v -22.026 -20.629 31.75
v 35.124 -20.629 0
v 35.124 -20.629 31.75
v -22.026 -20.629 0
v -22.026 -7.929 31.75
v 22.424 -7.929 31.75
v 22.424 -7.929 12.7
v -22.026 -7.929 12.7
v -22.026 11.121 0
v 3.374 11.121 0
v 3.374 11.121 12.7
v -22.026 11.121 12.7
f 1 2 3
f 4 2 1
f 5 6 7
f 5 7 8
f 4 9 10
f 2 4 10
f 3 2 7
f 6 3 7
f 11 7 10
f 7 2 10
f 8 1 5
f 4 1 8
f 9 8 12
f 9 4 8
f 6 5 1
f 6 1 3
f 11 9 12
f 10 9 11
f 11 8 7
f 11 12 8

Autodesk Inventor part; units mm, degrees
ref_plane "YZ Plane" through (0, 0, 0) normal (1, 0, 0) x (0, 1, 0)
ref_plane "XZ Plane" through (0, 0, 0) normal (0, 1, 0) x (-1, 0, 0)
ref_plane "XY Plane" through (0, 0, 0) normal (0, 0, 1) x (1, 0, 0)
sketch "Sketch1" plane through (0, 0, 0) normal (0, 0, 1) x (1, 0, 0)
  line L0 (-22.0262, 11.1206) -> (35.1238, 11.1206)
  line L1 (35.1238, 11.1206) -> (35.1238, -20.6294)
  line L2 (35.1238, -20.6294) -> (-22.0262, -20.6294)
  line L3 (-22.0262, -20.6294) -> (-22.0262, 11.1206)
  point P0 (0, 0)
  dimension "d0" = 57.15
  dimension "d1" = 31.75
extrude "Extrusion1" add sketch "Sketch1" along normal blind 31.75
sketch "Sketch2" plane through (0, 0, 31.75) normal (0, 0, 1) x (1, 0, 0)
  line L0 (35.1238, 11.1206) -> (-22.0262, 11.1206) projected
  line L1 (-22.0262, 11.1206) -> (35.1238, 11.1206)
  line L2 (35.1238, 11.1206) -> (35.1238, -7.9294)
  line L3 (35.1238, -7.9294) -> (-22.0262, -7.9294)
  line L4 (-22.0262, -7.9294) -> (-22.0262, 11.1206)
  point P0 (0, 0)
  dimension "d4" = 19.05
  dimension "d5" = 57.15
extrude "Extrusion2" cut sketch "Sketch2" against normal blind 19.05
sketch "Sketch3" plane through (0, 0, 31.75) normal (0, 0, 1) x (1, 0, 0)
  line L0 (-22.0262, -20.6294) -> (35.1238, -20.6294) projected
  line L1 (35.1238, -20.6294) -> (22.4238, -7.9294)
  line L2 (35.1238, -7.9294) -> (-22.0262, -7.9294) projected
  line L3 (22.4238, -7.9294) -> (35.1238, -7.9294)
  line L4 (35.1238, 11.1206) -> (35.1238, -20.6294) projected
  line L5 (35.1238, -7.9294) -> (35.1238, -20.6294)
  point P0 (0, 0)
  dimension "d8" = 44.45
extrude "Extrusion3" cut sketch "Sketch3" against normal blind 19.05
sketch "Sketch4" plane through (0, 0, 0) normal (0, 0, -1) x (-1, 0, 0)
  line L0 (-35.1238, -20.6294) -> (-22.4238, -7.9294) projected
  line L1 (-35.1238, -20.6294) -> (-3.3738, 11.1206)
  line L2 (22.0262, 11.1206) -> (-35.1238, 11.1206) projected
  line L3 (-3.3738, 11.1206) -> (-35.1238, 11.1206)
  line L4 (-35.1238, 11.1206) -> (-35.1238, -20.6294) projected
  line L5 (-35.1238, 11.1206) -> (-35.1238, -20.6294)
  point P0 (0, 0)
  dimension "d11" = 25.4
extrude "Extrusion4" cut sketch "Sketch4" against normal blind 19.05
properties part number "Figure 7_28_6"
